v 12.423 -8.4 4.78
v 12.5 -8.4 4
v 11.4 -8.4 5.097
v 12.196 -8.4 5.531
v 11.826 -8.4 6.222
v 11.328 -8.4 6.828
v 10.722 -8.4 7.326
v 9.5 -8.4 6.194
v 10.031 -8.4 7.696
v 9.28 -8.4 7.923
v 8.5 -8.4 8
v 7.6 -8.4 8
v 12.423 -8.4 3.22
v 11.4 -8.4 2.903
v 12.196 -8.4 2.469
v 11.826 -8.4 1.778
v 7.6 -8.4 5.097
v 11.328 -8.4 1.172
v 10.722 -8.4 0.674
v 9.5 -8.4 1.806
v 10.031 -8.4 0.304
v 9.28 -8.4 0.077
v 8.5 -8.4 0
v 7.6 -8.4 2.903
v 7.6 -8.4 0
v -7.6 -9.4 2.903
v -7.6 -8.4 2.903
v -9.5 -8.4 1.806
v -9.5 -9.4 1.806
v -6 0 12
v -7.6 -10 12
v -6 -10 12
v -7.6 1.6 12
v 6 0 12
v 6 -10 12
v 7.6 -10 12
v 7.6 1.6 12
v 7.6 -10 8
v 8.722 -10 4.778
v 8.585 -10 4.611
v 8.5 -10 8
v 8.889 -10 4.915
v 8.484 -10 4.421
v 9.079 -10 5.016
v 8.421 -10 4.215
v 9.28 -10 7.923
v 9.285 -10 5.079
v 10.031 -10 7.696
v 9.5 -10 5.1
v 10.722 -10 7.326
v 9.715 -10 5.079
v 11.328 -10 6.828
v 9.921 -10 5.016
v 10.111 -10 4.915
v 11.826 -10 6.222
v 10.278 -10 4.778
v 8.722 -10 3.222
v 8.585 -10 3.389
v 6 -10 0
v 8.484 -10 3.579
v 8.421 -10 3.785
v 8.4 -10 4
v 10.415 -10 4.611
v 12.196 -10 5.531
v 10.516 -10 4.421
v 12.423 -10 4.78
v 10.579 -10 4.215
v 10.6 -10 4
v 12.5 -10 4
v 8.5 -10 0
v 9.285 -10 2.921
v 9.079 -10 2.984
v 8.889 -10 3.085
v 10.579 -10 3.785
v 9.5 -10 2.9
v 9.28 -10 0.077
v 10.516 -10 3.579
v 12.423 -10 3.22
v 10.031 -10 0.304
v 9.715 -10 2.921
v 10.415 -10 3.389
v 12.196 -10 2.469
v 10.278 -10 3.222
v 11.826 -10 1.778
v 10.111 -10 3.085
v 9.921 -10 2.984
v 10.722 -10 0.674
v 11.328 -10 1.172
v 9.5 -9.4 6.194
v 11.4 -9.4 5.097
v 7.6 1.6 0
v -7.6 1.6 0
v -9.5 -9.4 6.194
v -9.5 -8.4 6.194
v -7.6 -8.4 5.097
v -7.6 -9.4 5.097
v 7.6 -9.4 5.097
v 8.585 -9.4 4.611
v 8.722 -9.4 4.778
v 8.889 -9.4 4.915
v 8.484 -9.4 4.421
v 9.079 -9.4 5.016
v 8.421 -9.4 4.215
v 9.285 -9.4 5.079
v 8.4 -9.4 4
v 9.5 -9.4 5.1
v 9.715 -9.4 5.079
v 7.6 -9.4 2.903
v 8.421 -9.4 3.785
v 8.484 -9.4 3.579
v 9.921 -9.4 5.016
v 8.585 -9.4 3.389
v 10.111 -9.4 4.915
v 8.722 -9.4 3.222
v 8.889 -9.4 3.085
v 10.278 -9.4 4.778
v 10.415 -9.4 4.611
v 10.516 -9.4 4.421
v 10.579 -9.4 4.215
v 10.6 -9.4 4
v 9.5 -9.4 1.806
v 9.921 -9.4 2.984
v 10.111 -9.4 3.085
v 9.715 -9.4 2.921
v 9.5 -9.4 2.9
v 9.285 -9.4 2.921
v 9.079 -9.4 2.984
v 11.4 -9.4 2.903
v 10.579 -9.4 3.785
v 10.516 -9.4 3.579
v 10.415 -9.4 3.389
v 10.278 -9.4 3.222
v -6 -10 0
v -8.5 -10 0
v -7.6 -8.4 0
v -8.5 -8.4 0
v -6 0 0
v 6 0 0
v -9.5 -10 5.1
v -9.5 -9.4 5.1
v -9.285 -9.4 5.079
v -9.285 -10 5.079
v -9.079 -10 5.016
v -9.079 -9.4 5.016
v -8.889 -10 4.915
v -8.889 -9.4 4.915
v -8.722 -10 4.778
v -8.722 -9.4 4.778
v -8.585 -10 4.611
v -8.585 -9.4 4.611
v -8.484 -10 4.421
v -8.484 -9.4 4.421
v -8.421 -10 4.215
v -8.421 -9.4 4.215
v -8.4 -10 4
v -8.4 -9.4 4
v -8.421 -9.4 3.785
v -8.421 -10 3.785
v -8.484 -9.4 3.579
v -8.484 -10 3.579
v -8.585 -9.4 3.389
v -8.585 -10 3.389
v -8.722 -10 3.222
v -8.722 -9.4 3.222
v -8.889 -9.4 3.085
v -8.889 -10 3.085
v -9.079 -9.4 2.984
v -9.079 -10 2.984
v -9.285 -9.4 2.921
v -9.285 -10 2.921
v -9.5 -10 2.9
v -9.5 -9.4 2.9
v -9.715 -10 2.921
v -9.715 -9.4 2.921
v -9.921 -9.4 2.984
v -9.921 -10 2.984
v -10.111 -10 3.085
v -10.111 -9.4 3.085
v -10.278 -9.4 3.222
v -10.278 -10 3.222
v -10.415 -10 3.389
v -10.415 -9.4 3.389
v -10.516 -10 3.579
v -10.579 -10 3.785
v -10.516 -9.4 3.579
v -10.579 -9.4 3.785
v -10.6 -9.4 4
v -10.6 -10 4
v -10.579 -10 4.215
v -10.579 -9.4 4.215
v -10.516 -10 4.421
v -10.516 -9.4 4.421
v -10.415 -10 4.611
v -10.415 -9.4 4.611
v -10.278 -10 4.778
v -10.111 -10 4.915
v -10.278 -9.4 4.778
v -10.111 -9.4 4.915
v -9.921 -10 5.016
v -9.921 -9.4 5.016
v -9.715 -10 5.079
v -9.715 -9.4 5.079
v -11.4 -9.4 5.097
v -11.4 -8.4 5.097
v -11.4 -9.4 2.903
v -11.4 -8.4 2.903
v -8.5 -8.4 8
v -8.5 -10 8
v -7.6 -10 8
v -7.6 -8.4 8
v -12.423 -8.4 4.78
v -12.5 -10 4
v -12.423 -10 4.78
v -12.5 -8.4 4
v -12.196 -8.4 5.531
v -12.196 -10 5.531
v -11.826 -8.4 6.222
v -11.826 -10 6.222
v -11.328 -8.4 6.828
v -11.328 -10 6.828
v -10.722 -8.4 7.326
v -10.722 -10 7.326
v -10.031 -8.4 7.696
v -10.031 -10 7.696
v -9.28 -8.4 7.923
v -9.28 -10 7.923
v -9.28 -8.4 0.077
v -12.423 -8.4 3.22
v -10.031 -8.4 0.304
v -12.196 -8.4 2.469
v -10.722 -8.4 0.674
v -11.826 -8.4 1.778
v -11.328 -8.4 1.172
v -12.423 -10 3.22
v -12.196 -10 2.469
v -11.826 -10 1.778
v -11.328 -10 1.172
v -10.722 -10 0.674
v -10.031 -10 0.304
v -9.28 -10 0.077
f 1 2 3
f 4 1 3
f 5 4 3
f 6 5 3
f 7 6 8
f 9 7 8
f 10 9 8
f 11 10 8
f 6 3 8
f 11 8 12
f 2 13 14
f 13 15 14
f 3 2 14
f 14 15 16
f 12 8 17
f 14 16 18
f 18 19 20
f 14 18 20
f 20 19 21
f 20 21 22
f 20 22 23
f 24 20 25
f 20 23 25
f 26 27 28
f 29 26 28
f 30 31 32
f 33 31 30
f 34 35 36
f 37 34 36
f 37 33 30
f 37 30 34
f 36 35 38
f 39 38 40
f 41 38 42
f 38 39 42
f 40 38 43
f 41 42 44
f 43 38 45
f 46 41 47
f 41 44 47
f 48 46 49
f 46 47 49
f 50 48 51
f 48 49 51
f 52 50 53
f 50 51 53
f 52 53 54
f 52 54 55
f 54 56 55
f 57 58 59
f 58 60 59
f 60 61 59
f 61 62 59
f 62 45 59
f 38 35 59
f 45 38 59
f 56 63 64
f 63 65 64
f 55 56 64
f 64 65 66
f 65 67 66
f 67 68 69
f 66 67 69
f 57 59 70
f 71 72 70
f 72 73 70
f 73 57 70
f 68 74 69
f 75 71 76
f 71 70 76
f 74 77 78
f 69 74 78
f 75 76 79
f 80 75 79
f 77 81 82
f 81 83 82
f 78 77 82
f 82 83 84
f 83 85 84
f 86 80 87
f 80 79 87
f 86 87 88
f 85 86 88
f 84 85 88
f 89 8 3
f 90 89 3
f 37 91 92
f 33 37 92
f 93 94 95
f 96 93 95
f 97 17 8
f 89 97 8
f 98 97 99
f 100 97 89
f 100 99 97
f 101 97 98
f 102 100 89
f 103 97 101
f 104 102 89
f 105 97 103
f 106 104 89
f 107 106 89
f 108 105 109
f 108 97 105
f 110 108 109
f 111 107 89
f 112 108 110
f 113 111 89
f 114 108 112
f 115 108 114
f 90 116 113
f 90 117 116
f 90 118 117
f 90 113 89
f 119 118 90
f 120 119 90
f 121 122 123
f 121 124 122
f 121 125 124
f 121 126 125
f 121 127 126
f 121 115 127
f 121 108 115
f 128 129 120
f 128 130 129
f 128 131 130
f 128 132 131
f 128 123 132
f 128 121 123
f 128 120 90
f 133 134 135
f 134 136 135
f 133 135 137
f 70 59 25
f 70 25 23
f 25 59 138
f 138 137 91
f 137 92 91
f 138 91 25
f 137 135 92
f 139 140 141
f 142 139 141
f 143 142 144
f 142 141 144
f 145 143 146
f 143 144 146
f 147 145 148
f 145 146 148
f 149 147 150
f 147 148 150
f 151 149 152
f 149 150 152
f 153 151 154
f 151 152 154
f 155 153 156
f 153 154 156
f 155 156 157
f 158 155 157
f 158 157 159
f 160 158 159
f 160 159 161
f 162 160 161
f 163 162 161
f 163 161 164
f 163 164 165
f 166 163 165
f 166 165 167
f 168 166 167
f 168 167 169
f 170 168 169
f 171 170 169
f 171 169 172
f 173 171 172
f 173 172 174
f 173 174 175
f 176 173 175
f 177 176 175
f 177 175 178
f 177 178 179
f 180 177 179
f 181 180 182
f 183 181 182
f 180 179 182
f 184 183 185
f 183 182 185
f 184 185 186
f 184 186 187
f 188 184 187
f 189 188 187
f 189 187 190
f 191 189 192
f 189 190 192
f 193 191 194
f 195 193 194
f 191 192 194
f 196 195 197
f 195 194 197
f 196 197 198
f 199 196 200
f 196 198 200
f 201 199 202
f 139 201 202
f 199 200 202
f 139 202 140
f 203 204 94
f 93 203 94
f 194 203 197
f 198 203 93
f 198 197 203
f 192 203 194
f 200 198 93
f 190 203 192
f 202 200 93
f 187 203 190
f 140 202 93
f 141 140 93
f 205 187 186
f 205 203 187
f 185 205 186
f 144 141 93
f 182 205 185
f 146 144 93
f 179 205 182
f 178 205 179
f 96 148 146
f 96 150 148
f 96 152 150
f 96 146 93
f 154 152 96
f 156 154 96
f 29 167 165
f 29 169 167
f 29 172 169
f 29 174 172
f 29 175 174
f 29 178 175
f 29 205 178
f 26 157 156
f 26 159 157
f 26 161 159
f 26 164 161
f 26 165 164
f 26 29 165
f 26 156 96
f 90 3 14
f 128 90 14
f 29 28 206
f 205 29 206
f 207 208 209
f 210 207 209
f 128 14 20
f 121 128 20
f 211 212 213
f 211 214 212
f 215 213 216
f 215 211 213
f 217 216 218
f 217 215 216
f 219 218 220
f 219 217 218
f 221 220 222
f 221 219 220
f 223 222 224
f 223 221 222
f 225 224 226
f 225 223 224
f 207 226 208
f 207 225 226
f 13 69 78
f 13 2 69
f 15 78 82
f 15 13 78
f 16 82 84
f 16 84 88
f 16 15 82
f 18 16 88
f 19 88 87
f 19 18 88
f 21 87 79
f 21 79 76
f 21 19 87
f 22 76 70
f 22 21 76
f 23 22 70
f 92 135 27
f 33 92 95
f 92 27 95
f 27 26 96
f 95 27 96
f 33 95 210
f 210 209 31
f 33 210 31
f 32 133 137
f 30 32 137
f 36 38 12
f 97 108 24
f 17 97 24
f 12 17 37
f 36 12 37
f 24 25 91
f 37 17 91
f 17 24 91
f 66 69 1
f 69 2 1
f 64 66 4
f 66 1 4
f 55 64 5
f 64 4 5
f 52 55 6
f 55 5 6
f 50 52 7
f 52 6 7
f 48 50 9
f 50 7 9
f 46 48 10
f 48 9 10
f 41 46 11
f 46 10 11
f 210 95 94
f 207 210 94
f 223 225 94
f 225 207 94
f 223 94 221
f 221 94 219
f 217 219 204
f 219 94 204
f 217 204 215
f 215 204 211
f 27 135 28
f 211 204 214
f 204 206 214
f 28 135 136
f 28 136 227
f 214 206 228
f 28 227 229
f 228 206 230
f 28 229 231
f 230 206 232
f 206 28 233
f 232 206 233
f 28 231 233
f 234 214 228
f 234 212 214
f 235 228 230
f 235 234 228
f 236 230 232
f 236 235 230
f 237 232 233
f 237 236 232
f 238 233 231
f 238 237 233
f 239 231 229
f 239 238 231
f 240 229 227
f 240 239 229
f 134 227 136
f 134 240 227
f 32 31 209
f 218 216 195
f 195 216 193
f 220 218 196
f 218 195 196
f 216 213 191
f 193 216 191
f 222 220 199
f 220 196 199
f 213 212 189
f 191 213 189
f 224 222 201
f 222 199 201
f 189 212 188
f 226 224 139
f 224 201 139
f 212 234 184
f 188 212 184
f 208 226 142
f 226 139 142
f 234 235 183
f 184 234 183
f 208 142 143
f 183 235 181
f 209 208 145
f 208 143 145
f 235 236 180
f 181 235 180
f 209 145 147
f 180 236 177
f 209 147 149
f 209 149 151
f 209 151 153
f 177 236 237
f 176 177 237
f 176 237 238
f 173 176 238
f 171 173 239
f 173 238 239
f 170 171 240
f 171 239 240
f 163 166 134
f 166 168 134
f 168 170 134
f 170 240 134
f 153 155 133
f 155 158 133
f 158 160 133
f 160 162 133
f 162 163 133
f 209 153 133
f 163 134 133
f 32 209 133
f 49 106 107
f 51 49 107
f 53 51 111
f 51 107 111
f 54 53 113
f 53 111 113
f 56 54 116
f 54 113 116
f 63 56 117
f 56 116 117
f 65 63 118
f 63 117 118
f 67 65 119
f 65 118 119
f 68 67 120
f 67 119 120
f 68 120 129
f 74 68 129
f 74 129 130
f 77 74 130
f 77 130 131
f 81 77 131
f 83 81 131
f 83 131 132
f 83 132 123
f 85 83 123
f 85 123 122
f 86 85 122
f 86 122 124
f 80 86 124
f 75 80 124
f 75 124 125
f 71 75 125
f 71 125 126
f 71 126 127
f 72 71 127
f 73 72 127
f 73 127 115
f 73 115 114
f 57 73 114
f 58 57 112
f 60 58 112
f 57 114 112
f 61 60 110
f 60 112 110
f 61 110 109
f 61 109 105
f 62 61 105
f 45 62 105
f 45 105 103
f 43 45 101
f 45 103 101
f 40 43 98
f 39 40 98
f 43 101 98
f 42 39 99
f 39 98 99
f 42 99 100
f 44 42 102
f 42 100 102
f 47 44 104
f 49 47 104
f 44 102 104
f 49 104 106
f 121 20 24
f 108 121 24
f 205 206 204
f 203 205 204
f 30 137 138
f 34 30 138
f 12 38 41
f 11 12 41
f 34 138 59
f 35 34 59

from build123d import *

# Parameters (mm, degrees)
EXTRUDE_1_DEPTH     = 12
SKETCH_2_R          = 1.1
CUT_EXTRUDE_1_DEPTH = 10
SKETCH_3_W          = 4.9
SKETCH_3_H          = 4
CUT_EXTRUDE_2_DEPTH = 1.6
FILLET_1_R          = 4
CUT_EXTRUDE_3_DEPTH = 1


with BuildPart() as part:
    # 草圖1 → 伸長-薄件1 (new body)
    with BuildSketch(Plane.XY):
        Polygon((-12.5, -10), (-6, -10), (-6, 0), (6, 0), (6, -10), (12.5, -10), (12.5, -8.4), (7.6, -8.4), (7.6, 1.6), (-7.6, 1.6), (-7.6, -8.4), (-12.5, -8.4), align=None)
    extrude(amount=EXTRUDE_1_DEPTH)

    # 草圖2 → 除料-伸長1 (cut)
    with BuildSketch(Plane(origin=(0, -8.4, 0), x_dir=(1, 0, 0), z_dir=(0, 1, 0))):
        with Locations(Location((9.5, -4, 0), (0, 0, 270))):
            Circle(SKETCH_2_R)
        with Locations(Location((-9.5, -4, 0), (0, 0, 270))):
            Circle(SKETCH_2_R)
    extrude(amount=-CUT_EXTRUDE_1_DEPTH, mode=Mode.SUBTRACT)

    # 草圖3 → 除料-伸長2 (cut)
    with BuildSketch(Plane.XZ.offset(10)):
        with Locations((-10.05, 10)):
            Rectangle(SKETCH_3_W, SKETCH_3_H)
        with Locations((10.05, 10)):
            Rectangle(SKETCH_3_W, SKETCH_3_H)
    extrude(amount=-CUT_EXTRUDE_2_DEPTH, mode=Mode.SUBTRACT)

    # 圓角1
    fillet_1_edges = [part.edges().sort_by_distance(p)[0] for p in [
        (-12.5, -9.2, 0),
        (-12.5, -9.2, 8),
        (12.5, -9.2, 0),
        (12.5, -9.2, 8),
    ]]
    fillet(fillet_1_edges, radius=FILLET_1_R - 0.0001)  # a hair under: the kernel refuses the full size

    # 草圖4 → 除料-伸長3 (cut)
    with BuildSketch(Plane(origin=(0, -8.4, 0), x_dir=(1, 0, 0), z_dir=(0, 1, 0))):
        Polygon((-7.6, -5.096965511), (-7.6, -2.903034489), (-9.5, -1.806068977), (-11.4, -2.903034489), (-11.4, -5.096965511), (-9.5, -6.193931023), align=None)
        Polygon((7.6, -5.096965511), (9.5, -6.193931023), (11.4, -5.096965511), (11.4, -2.903034489), (9.5, -1.806068977), (7.6, -2.903034489), align=None)
    extrude(amount=-CUT_EXTRUDE_3_DEPTH, mode=Mode.SUBTRACT)


solid = part.part
